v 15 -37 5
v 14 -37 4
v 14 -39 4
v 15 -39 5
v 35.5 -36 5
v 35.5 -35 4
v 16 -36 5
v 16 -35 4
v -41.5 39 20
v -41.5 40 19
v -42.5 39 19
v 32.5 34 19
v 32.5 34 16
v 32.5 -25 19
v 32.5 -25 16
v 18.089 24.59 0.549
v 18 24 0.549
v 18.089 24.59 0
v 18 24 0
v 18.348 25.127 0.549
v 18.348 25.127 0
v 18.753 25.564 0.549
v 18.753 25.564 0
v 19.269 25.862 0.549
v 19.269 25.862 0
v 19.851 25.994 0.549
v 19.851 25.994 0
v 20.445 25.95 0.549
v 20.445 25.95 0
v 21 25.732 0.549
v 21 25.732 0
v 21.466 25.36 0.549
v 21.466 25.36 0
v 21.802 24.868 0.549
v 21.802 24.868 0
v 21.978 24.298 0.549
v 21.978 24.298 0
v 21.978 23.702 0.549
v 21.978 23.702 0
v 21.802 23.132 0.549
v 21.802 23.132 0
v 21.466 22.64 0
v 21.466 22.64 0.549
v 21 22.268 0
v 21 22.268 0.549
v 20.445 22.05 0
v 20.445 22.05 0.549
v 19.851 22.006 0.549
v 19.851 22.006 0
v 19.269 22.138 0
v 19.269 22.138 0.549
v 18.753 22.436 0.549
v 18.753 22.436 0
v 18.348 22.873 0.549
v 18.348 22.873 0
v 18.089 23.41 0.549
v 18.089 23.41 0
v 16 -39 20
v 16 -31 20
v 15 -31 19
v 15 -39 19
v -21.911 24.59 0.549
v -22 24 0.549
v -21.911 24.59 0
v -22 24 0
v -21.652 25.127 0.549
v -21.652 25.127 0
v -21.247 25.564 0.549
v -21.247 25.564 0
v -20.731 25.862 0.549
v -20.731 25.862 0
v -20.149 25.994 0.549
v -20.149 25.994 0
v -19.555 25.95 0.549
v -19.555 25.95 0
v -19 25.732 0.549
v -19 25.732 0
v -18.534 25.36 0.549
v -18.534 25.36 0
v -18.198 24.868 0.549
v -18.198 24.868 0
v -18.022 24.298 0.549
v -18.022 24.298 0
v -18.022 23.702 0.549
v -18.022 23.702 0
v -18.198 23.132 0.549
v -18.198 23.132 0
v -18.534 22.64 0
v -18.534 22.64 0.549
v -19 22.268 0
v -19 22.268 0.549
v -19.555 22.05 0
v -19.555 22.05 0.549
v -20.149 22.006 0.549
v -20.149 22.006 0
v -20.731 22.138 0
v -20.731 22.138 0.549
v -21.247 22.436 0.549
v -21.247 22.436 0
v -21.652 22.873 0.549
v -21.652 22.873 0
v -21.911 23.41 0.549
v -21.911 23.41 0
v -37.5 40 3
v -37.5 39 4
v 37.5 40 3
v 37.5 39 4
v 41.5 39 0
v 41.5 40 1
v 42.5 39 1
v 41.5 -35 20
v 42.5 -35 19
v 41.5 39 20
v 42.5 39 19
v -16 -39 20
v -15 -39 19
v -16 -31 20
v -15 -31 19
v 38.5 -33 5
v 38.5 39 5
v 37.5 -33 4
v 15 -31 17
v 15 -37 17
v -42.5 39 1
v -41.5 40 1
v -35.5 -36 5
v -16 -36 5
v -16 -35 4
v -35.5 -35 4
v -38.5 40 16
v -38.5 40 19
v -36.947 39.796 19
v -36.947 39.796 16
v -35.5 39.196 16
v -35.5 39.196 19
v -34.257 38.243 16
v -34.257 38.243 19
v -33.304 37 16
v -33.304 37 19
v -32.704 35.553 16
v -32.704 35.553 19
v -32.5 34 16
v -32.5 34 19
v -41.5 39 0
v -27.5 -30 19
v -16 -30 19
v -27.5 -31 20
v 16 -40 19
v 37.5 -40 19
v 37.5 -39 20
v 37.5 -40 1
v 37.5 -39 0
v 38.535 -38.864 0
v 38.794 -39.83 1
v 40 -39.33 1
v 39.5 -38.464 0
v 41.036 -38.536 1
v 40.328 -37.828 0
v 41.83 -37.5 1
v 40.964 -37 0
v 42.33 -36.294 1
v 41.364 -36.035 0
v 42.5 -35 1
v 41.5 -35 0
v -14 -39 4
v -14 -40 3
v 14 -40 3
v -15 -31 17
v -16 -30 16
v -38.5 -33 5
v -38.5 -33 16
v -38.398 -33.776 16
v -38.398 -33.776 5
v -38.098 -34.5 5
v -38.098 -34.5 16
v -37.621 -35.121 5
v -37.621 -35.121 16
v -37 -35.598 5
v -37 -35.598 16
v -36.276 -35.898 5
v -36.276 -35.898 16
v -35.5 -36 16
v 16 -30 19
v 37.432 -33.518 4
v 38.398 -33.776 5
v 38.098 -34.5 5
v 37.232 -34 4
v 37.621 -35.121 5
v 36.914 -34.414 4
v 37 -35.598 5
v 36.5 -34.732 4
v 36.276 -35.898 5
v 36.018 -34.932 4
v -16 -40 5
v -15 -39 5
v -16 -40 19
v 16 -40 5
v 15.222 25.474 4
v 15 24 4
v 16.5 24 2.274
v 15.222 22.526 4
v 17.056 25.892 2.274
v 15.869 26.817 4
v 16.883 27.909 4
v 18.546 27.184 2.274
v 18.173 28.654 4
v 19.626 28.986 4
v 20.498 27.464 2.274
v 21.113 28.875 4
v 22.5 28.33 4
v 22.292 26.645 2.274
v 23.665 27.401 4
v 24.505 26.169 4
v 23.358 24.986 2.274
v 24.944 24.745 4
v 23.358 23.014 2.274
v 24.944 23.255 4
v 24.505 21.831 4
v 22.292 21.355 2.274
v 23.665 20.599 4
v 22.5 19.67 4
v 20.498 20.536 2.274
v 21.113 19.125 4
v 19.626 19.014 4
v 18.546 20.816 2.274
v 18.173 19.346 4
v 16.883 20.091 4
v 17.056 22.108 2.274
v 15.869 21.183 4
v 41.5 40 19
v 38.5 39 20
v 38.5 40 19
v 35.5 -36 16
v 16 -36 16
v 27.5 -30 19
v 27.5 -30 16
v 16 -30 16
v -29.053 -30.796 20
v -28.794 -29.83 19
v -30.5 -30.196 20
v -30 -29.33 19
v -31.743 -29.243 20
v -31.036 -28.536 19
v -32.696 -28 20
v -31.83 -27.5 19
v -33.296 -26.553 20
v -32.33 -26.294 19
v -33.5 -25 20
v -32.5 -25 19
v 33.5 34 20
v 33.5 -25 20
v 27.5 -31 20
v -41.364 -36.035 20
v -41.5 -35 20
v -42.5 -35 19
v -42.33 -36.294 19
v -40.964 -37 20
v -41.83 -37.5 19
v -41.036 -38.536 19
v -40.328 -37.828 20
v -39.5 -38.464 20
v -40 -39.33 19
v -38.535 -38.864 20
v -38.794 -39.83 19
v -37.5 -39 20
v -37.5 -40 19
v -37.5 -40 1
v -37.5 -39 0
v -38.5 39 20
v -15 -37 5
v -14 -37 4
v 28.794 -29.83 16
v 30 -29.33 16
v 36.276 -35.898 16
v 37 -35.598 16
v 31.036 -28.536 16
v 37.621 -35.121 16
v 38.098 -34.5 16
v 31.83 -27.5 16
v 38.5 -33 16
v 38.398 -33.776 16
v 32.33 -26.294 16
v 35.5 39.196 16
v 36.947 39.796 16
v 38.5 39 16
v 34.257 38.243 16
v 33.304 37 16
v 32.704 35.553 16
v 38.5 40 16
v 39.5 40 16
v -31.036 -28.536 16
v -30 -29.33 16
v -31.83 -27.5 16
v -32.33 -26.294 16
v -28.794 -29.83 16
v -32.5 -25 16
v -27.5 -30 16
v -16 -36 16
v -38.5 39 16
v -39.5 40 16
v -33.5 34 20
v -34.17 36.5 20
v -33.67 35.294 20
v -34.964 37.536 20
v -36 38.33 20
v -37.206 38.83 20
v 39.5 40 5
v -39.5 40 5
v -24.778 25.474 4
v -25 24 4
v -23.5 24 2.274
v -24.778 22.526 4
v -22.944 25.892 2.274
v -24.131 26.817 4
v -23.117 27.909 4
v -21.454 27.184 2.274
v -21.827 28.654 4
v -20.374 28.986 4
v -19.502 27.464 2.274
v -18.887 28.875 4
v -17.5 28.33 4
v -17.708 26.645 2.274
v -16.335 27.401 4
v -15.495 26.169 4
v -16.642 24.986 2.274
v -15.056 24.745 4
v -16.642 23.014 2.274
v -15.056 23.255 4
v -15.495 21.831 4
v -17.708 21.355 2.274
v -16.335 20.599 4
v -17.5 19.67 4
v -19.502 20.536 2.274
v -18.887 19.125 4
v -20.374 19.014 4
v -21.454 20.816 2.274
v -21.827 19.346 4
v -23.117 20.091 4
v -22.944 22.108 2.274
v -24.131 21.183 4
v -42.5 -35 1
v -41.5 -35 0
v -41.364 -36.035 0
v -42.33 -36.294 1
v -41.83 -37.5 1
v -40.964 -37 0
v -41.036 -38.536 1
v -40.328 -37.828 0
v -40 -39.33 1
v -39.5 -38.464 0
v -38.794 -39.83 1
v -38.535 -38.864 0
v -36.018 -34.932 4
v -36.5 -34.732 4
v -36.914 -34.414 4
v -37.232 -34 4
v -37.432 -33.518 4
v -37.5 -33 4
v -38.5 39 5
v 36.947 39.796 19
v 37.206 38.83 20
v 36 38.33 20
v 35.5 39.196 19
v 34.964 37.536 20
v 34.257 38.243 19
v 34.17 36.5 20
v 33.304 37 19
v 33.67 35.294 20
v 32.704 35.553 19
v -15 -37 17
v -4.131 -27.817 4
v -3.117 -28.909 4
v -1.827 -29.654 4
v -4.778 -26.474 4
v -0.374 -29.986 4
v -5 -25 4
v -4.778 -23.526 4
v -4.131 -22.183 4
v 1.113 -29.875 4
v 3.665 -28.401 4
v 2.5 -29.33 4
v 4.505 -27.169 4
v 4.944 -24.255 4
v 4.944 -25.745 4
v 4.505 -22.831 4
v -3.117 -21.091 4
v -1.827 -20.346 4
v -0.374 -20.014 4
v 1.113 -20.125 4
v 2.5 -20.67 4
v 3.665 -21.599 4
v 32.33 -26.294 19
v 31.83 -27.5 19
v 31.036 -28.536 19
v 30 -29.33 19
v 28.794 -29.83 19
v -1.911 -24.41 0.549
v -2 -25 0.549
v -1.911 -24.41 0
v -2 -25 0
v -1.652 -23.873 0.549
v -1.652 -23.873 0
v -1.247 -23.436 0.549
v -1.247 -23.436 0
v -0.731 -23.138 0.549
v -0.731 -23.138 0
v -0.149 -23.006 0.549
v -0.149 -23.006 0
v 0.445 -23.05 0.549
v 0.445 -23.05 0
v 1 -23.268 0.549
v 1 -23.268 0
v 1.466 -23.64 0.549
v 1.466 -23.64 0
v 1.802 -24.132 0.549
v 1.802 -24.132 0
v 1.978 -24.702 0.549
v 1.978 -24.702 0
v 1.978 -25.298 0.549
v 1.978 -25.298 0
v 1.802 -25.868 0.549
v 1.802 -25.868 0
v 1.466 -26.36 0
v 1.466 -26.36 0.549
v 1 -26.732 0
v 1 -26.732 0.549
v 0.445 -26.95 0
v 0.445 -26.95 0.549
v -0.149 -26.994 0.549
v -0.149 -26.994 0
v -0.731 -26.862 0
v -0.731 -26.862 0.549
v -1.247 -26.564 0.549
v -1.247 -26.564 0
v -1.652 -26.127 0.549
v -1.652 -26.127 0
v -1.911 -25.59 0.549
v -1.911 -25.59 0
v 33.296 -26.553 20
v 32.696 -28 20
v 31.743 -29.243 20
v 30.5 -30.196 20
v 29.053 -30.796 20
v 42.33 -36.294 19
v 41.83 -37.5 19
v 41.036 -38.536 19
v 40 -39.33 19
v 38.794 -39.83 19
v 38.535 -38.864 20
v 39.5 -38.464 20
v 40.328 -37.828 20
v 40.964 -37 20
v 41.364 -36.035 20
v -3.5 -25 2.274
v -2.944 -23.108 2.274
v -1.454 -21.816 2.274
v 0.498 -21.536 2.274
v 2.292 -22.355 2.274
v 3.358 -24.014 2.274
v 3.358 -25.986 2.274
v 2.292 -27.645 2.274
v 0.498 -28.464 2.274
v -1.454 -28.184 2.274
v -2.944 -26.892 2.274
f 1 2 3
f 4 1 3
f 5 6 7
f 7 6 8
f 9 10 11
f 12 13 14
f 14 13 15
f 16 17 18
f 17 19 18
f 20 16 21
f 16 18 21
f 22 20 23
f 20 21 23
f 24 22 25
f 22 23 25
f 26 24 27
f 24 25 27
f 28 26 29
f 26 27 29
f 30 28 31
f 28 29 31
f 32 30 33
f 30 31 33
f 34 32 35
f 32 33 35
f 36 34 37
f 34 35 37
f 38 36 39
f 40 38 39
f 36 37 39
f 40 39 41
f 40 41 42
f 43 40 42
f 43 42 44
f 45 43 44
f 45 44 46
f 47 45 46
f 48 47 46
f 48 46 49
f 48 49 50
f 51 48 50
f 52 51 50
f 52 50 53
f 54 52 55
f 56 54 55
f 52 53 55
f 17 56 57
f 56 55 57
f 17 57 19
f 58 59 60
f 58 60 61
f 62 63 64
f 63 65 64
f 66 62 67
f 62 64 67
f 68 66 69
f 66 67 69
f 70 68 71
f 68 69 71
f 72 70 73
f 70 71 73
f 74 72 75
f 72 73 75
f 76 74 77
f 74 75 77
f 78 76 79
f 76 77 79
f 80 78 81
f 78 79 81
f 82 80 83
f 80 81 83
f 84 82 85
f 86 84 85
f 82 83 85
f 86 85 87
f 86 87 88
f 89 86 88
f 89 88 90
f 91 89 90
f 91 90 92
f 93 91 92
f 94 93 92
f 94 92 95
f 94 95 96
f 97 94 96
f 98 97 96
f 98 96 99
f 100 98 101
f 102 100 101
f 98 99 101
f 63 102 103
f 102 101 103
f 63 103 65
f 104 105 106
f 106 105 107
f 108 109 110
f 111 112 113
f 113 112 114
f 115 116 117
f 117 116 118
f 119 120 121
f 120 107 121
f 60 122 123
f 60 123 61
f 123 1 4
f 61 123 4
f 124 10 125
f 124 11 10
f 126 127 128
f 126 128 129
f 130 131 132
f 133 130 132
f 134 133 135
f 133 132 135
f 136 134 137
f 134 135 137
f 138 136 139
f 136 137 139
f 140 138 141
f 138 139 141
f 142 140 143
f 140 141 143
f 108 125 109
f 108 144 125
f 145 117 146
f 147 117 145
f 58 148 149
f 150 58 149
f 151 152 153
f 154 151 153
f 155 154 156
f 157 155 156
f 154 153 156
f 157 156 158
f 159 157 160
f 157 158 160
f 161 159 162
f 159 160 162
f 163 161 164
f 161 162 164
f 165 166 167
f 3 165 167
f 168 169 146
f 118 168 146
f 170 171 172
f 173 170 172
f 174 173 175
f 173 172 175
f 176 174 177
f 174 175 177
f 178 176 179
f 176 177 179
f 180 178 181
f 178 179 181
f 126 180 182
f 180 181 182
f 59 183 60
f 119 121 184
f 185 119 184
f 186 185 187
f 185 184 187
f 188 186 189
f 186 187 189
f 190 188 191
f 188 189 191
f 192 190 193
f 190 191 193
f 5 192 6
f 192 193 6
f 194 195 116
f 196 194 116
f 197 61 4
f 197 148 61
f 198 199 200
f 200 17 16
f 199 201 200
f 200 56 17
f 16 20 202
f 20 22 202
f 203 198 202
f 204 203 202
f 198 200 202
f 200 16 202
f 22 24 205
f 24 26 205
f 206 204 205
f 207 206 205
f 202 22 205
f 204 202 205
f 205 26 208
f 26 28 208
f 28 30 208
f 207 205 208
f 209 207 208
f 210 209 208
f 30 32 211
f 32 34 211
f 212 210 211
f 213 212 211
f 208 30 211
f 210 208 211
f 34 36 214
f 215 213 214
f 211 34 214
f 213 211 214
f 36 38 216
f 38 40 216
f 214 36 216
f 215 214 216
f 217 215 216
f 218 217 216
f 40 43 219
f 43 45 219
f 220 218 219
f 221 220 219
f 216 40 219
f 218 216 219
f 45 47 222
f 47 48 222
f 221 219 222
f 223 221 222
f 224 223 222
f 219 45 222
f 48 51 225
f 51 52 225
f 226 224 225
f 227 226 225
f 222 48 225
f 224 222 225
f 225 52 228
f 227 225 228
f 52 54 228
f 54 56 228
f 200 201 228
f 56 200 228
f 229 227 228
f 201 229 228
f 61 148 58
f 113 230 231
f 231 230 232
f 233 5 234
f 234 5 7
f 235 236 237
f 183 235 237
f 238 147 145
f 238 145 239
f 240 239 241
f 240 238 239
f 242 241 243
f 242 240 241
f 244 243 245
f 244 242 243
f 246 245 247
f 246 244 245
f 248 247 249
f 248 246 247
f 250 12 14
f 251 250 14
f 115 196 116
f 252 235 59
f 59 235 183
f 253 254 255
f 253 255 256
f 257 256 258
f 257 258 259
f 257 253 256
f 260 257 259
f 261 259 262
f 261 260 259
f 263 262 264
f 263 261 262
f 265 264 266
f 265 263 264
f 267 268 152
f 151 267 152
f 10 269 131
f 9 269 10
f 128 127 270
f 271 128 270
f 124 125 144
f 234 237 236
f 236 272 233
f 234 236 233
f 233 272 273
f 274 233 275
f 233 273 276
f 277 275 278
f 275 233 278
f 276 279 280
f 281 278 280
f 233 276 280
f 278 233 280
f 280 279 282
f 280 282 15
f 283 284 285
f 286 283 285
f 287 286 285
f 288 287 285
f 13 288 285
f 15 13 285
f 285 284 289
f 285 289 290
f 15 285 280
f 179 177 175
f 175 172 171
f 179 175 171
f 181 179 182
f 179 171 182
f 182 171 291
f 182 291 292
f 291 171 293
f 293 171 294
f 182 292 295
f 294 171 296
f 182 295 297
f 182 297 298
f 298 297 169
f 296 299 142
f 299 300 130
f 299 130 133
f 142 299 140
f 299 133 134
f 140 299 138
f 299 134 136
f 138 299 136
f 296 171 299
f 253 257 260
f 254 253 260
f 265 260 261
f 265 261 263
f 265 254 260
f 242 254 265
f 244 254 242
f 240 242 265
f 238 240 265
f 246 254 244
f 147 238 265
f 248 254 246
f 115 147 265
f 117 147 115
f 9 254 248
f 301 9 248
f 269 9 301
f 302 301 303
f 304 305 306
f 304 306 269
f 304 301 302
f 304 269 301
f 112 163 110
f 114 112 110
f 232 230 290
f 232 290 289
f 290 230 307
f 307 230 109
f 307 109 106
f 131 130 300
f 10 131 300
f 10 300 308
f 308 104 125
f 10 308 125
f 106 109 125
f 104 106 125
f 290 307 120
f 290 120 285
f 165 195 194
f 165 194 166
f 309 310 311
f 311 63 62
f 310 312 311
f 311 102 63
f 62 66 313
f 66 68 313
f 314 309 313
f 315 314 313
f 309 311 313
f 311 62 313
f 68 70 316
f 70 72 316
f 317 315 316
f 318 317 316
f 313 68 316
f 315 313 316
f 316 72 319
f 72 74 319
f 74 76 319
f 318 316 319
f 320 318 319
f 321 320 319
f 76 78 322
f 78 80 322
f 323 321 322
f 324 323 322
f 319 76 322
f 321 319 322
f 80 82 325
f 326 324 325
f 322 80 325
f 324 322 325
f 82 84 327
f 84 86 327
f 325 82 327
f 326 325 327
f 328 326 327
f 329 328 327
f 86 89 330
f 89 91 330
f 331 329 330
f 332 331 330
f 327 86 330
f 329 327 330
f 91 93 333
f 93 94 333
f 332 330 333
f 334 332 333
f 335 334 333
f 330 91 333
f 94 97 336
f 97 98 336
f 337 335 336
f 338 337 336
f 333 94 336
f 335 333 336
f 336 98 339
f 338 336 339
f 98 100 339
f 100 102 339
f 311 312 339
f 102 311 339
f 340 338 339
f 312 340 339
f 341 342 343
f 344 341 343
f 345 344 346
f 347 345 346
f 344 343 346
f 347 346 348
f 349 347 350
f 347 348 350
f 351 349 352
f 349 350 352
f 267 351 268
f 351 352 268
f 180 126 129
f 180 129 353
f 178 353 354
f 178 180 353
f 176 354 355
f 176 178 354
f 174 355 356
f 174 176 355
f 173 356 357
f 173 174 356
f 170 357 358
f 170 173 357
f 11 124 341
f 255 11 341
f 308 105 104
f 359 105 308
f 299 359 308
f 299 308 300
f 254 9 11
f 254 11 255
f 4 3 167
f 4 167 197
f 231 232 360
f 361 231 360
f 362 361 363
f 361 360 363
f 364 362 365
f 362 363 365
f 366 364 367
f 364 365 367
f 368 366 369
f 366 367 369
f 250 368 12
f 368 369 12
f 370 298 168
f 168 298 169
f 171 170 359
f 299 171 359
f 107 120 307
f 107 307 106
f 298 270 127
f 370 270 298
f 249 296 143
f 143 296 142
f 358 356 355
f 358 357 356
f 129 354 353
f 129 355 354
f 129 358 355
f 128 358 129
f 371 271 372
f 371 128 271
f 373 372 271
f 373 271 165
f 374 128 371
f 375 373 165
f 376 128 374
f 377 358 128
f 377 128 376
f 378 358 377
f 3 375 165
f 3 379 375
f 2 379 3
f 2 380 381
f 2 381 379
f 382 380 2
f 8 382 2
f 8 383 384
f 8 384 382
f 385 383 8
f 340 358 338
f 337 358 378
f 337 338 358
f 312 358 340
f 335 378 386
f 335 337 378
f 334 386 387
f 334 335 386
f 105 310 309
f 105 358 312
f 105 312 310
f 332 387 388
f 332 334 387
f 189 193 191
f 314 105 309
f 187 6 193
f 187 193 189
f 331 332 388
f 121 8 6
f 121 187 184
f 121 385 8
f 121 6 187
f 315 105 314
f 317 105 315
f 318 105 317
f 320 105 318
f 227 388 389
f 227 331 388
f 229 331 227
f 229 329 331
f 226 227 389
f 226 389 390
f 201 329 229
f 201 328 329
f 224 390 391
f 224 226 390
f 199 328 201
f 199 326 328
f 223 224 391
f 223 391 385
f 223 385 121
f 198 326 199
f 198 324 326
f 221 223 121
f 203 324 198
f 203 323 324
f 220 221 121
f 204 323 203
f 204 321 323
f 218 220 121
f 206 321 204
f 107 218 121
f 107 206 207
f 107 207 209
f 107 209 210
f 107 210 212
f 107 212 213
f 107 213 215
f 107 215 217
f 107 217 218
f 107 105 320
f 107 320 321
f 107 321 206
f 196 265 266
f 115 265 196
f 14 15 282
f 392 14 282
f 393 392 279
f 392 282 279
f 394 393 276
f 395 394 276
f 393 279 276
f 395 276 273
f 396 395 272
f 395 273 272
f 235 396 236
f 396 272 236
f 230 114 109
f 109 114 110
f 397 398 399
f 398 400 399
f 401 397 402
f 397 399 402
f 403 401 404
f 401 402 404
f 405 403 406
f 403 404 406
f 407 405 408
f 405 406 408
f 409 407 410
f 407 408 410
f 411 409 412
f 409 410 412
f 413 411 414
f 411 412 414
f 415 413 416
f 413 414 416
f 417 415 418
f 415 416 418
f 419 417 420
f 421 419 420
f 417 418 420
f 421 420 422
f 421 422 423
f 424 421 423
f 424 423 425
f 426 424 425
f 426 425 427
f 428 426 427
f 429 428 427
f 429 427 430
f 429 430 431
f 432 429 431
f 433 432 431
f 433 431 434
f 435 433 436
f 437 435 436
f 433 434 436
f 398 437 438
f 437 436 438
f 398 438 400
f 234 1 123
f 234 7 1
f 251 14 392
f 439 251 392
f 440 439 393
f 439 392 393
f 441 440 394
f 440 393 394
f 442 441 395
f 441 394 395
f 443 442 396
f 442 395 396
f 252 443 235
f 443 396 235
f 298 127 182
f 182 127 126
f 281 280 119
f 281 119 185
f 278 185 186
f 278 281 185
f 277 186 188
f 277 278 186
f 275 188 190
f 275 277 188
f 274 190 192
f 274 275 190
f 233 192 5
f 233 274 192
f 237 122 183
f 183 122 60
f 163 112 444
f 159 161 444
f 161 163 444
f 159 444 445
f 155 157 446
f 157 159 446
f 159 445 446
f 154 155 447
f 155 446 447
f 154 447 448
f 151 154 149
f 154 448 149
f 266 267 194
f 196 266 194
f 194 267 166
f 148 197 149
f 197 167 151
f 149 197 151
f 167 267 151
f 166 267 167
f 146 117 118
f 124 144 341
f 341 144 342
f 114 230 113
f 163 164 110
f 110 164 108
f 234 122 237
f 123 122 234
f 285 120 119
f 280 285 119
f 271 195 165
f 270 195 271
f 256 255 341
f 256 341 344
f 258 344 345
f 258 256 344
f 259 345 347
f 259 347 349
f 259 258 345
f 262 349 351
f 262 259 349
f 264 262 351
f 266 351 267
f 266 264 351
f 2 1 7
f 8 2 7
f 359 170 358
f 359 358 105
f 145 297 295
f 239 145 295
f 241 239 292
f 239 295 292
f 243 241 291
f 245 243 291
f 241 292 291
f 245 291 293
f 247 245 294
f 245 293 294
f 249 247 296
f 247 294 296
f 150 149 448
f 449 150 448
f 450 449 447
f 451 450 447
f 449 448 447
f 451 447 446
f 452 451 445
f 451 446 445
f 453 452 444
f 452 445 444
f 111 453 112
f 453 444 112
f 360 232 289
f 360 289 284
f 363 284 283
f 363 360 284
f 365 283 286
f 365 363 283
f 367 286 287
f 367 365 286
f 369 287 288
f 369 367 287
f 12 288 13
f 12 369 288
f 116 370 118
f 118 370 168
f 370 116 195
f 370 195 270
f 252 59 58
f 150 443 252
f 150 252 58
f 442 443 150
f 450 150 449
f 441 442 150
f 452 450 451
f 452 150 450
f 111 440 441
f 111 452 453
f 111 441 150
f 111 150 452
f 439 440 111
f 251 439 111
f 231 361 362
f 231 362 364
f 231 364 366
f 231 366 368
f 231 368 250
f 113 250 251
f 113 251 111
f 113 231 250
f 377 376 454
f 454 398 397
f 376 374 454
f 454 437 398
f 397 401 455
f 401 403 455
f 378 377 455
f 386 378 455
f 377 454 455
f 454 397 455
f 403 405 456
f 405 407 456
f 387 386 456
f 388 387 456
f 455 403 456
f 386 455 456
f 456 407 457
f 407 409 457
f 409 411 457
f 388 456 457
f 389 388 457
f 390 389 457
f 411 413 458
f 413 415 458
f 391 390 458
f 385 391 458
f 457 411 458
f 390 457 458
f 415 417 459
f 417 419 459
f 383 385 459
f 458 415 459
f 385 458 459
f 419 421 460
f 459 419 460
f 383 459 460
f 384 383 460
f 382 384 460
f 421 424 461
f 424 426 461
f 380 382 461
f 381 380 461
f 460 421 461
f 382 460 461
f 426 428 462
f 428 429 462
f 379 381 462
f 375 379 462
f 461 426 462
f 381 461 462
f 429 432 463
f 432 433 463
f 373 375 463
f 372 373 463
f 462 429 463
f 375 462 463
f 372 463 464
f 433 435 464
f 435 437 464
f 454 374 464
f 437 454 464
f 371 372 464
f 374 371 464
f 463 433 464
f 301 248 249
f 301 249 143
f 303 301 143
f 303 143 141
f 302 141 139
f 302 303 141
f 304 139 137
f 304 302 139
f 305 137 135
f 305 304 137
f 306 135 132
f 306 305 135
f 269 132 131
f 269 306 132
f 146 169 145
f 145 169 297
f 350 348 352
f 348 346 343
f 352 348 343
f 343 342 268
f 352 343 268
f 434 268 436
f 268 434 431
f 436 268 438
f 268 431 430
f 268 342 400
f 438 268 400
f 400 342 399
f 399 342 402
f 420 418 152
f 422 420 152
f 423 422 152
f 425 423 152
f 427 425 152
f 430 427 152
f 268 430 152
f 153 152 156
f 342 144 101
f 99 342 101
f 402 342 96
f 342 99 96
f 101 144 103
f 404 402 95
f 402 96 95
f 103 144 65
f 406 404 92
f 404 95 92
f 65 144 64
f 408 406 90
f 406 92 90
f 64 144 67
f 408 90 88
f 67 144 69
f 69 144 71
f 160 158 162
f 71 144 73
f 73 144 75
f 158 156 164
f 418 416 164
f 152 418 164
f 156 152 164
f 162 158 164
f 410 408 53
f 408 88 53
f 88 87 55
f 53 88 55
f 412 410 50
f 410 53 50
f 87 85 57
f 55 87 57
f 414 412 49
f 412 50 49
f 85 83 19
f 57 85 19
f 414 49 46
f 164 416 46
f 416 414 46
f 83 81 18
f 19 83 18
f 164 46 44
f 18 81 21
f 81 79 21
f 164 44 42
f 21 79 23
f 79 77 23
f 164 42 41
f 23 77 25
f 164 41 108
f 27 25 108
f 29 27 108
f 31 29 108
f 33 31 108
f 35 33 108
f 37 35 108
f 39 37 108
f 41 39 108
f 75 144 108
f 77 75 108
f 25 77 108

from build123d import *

# Parameters (mm, degrees)
F0_W            = 85
F0_H            = 80
F1_DEPTH        = 4
F3_DEPTH        = 12
F5_DEPTH        = 4
F6_R            = 5
F7_R            = 3
F8_R            = 6
F9_SIZE         = 1
F11_D           = 4
F11_CSINK_D     = 10
F11_CSINK_ANGLE = 82


with BuildPart() as f1:
    # F0 (on Top) → F1 (new body)
    with BuildSketch(Plane.XY):
        Rectangle(F0_W, F0_H)
    extrude(amount=F1_DEPTH)

    # F2 (on face) → F3 (join)
    with BuildSketch(Plane.XY.offset(4)):
        Polygon((-42.5, 40), (-42.5, -40), (-15, -40), (-15, -36), (-38.5, -36), (-38.5, 40), align=None)
        Polygon((42.5, 40), (38.5, 40), (38.5, -36), (15, -36), (15, -40), (42.5, -40), align=None)
    extrude(amount=F3_DEPTH)

    # F4 (on face) → F5 (join)
    with BuildSketch(Plane.XY.offset(16)):
        with BuildLine():
            Line((-42.5, 40), (-42.5, -40))
            Line((-42.5, -40), (-15, -40))
            Line((-15, -40), (-15, -36))
            Line((-15, -36), (-15, -30))
            Line((-15, -30), (-27.5, -30))
            ThreePointArc((-27.5, -30), (-31.0355339059, -28.5355339059), (-32.5, -25))
            Line((-32.5, -25), (-32.5, 40))
            Line((-32.5, 40), (-38.5, 40))
            Line((-38.5, 40), (-42.5, 40))
        make_face()
        with BuildLine():
            Line((38.5, 40), (32.5, 40))
            Line((32.5, 40), (32.5, -25))
            ThreePointArc((32.5, -25), (31.0355339059, -28.5355339059), (27.5, -30))
            Line((27.5, -30), (15, -30))
            Line((15, -30), (15, -36))
            Line((15, -36), (15, -40))
            Line((15, -40), (42.5, -40))
            Line((42.5, -40), (42.5, 40))
            Line((42.5, 40), (38.5, 40))
        make_face()
    extrude(amount=F5_DEPTH)

    # F6
    f6_edges = [f1.edges().sort_by_distance(p)[0] for p in [
        (-42.5, -40, 10),
        (42.5, -40, 10),
    ]]
    fillet(f6_edges, radius=F6_R)

    # F7
    f7_edges = [f1.edges().sort_by_distance(p)[0] for p in [
        (38.5, -36, 10),
        (-38.5, -36, 10),
    ]]
    fillet(f7_edges, radius=F7_R)

    # F8
    f8_edges = [f1.edges().sort_by_distance(p)[0] for p in [
        (-32.5, 40, 18),
        (32.5, 40, 18),
    ]]
    fillet(f8_edges, radius=F8_R)

    # F9
    f9_edges = [f1.edges().sort_by_distance(p)[0] for p in [
        (40.5, 40, 20),
        (38.5, 40, 18),
        (42.5, 40, 10),
        (38.5, 40, 10),
        (0, 40, 0),
        (0, 40, 4),
        (-42.5, 40, 10),
        (-38.5, 40, 10),
        (-40.5, 40, 20),
        (-38.5, 40, 18),
        (-26.25, -40, 20),
        (-37.5, -40, 10),
        (-15, -40, 12),
        (0, -40, 0),
        (0, -40, 4),
        (37.5, -40, 10),
        (15, -40, 12),
        (26.25, -40, 20),
        (41.035534, -38.535534, 0),
        (42.5, -35, 10),
        (41.035534, -38.535534, 20),
        (42.5, 2.5, 20),
        (42.5, 2.5, 0),
        (-41.035534, -38.535534, 20),
        (-42.5, -35, 10),
        (-41.035534, -38.535534, 0),
        (-42.5, 2.5, 20),
        (-42.5, 2.5, 0),
        (-25.25, -36, 4),
        (-37.62132, -35.12132, 4),
        (-15, -38, 4),
        (-38.5, 3.5, 4),
        (15, -38, 4),
        (38.5, 3.5, 4),
        (25.25, -36, 4),
        (37.62132, -35.12132, 4),
        (15, -36, 10),
        (15, -33, 16),
        (15, -30, 18),
        (15, -35, 20),
        (-15, -35, 20),
        (-15, -30, 18),
        (-15, -33, 16),
        (-15, -36, 10),
    ]]
    chamfer(f9_edges, length=F9_SIZE)

    # F11 (through all)
    with Locations(Plane.XY.offset(4)):
        with Locations((-20, 24), (20, 24), (0, -25)):
            CounterSinkHole(F11_D / 2, F11_CSINK_D / 2, counter_sink_angle=F11_CSINK_ANGLE)


solid = f1.part
